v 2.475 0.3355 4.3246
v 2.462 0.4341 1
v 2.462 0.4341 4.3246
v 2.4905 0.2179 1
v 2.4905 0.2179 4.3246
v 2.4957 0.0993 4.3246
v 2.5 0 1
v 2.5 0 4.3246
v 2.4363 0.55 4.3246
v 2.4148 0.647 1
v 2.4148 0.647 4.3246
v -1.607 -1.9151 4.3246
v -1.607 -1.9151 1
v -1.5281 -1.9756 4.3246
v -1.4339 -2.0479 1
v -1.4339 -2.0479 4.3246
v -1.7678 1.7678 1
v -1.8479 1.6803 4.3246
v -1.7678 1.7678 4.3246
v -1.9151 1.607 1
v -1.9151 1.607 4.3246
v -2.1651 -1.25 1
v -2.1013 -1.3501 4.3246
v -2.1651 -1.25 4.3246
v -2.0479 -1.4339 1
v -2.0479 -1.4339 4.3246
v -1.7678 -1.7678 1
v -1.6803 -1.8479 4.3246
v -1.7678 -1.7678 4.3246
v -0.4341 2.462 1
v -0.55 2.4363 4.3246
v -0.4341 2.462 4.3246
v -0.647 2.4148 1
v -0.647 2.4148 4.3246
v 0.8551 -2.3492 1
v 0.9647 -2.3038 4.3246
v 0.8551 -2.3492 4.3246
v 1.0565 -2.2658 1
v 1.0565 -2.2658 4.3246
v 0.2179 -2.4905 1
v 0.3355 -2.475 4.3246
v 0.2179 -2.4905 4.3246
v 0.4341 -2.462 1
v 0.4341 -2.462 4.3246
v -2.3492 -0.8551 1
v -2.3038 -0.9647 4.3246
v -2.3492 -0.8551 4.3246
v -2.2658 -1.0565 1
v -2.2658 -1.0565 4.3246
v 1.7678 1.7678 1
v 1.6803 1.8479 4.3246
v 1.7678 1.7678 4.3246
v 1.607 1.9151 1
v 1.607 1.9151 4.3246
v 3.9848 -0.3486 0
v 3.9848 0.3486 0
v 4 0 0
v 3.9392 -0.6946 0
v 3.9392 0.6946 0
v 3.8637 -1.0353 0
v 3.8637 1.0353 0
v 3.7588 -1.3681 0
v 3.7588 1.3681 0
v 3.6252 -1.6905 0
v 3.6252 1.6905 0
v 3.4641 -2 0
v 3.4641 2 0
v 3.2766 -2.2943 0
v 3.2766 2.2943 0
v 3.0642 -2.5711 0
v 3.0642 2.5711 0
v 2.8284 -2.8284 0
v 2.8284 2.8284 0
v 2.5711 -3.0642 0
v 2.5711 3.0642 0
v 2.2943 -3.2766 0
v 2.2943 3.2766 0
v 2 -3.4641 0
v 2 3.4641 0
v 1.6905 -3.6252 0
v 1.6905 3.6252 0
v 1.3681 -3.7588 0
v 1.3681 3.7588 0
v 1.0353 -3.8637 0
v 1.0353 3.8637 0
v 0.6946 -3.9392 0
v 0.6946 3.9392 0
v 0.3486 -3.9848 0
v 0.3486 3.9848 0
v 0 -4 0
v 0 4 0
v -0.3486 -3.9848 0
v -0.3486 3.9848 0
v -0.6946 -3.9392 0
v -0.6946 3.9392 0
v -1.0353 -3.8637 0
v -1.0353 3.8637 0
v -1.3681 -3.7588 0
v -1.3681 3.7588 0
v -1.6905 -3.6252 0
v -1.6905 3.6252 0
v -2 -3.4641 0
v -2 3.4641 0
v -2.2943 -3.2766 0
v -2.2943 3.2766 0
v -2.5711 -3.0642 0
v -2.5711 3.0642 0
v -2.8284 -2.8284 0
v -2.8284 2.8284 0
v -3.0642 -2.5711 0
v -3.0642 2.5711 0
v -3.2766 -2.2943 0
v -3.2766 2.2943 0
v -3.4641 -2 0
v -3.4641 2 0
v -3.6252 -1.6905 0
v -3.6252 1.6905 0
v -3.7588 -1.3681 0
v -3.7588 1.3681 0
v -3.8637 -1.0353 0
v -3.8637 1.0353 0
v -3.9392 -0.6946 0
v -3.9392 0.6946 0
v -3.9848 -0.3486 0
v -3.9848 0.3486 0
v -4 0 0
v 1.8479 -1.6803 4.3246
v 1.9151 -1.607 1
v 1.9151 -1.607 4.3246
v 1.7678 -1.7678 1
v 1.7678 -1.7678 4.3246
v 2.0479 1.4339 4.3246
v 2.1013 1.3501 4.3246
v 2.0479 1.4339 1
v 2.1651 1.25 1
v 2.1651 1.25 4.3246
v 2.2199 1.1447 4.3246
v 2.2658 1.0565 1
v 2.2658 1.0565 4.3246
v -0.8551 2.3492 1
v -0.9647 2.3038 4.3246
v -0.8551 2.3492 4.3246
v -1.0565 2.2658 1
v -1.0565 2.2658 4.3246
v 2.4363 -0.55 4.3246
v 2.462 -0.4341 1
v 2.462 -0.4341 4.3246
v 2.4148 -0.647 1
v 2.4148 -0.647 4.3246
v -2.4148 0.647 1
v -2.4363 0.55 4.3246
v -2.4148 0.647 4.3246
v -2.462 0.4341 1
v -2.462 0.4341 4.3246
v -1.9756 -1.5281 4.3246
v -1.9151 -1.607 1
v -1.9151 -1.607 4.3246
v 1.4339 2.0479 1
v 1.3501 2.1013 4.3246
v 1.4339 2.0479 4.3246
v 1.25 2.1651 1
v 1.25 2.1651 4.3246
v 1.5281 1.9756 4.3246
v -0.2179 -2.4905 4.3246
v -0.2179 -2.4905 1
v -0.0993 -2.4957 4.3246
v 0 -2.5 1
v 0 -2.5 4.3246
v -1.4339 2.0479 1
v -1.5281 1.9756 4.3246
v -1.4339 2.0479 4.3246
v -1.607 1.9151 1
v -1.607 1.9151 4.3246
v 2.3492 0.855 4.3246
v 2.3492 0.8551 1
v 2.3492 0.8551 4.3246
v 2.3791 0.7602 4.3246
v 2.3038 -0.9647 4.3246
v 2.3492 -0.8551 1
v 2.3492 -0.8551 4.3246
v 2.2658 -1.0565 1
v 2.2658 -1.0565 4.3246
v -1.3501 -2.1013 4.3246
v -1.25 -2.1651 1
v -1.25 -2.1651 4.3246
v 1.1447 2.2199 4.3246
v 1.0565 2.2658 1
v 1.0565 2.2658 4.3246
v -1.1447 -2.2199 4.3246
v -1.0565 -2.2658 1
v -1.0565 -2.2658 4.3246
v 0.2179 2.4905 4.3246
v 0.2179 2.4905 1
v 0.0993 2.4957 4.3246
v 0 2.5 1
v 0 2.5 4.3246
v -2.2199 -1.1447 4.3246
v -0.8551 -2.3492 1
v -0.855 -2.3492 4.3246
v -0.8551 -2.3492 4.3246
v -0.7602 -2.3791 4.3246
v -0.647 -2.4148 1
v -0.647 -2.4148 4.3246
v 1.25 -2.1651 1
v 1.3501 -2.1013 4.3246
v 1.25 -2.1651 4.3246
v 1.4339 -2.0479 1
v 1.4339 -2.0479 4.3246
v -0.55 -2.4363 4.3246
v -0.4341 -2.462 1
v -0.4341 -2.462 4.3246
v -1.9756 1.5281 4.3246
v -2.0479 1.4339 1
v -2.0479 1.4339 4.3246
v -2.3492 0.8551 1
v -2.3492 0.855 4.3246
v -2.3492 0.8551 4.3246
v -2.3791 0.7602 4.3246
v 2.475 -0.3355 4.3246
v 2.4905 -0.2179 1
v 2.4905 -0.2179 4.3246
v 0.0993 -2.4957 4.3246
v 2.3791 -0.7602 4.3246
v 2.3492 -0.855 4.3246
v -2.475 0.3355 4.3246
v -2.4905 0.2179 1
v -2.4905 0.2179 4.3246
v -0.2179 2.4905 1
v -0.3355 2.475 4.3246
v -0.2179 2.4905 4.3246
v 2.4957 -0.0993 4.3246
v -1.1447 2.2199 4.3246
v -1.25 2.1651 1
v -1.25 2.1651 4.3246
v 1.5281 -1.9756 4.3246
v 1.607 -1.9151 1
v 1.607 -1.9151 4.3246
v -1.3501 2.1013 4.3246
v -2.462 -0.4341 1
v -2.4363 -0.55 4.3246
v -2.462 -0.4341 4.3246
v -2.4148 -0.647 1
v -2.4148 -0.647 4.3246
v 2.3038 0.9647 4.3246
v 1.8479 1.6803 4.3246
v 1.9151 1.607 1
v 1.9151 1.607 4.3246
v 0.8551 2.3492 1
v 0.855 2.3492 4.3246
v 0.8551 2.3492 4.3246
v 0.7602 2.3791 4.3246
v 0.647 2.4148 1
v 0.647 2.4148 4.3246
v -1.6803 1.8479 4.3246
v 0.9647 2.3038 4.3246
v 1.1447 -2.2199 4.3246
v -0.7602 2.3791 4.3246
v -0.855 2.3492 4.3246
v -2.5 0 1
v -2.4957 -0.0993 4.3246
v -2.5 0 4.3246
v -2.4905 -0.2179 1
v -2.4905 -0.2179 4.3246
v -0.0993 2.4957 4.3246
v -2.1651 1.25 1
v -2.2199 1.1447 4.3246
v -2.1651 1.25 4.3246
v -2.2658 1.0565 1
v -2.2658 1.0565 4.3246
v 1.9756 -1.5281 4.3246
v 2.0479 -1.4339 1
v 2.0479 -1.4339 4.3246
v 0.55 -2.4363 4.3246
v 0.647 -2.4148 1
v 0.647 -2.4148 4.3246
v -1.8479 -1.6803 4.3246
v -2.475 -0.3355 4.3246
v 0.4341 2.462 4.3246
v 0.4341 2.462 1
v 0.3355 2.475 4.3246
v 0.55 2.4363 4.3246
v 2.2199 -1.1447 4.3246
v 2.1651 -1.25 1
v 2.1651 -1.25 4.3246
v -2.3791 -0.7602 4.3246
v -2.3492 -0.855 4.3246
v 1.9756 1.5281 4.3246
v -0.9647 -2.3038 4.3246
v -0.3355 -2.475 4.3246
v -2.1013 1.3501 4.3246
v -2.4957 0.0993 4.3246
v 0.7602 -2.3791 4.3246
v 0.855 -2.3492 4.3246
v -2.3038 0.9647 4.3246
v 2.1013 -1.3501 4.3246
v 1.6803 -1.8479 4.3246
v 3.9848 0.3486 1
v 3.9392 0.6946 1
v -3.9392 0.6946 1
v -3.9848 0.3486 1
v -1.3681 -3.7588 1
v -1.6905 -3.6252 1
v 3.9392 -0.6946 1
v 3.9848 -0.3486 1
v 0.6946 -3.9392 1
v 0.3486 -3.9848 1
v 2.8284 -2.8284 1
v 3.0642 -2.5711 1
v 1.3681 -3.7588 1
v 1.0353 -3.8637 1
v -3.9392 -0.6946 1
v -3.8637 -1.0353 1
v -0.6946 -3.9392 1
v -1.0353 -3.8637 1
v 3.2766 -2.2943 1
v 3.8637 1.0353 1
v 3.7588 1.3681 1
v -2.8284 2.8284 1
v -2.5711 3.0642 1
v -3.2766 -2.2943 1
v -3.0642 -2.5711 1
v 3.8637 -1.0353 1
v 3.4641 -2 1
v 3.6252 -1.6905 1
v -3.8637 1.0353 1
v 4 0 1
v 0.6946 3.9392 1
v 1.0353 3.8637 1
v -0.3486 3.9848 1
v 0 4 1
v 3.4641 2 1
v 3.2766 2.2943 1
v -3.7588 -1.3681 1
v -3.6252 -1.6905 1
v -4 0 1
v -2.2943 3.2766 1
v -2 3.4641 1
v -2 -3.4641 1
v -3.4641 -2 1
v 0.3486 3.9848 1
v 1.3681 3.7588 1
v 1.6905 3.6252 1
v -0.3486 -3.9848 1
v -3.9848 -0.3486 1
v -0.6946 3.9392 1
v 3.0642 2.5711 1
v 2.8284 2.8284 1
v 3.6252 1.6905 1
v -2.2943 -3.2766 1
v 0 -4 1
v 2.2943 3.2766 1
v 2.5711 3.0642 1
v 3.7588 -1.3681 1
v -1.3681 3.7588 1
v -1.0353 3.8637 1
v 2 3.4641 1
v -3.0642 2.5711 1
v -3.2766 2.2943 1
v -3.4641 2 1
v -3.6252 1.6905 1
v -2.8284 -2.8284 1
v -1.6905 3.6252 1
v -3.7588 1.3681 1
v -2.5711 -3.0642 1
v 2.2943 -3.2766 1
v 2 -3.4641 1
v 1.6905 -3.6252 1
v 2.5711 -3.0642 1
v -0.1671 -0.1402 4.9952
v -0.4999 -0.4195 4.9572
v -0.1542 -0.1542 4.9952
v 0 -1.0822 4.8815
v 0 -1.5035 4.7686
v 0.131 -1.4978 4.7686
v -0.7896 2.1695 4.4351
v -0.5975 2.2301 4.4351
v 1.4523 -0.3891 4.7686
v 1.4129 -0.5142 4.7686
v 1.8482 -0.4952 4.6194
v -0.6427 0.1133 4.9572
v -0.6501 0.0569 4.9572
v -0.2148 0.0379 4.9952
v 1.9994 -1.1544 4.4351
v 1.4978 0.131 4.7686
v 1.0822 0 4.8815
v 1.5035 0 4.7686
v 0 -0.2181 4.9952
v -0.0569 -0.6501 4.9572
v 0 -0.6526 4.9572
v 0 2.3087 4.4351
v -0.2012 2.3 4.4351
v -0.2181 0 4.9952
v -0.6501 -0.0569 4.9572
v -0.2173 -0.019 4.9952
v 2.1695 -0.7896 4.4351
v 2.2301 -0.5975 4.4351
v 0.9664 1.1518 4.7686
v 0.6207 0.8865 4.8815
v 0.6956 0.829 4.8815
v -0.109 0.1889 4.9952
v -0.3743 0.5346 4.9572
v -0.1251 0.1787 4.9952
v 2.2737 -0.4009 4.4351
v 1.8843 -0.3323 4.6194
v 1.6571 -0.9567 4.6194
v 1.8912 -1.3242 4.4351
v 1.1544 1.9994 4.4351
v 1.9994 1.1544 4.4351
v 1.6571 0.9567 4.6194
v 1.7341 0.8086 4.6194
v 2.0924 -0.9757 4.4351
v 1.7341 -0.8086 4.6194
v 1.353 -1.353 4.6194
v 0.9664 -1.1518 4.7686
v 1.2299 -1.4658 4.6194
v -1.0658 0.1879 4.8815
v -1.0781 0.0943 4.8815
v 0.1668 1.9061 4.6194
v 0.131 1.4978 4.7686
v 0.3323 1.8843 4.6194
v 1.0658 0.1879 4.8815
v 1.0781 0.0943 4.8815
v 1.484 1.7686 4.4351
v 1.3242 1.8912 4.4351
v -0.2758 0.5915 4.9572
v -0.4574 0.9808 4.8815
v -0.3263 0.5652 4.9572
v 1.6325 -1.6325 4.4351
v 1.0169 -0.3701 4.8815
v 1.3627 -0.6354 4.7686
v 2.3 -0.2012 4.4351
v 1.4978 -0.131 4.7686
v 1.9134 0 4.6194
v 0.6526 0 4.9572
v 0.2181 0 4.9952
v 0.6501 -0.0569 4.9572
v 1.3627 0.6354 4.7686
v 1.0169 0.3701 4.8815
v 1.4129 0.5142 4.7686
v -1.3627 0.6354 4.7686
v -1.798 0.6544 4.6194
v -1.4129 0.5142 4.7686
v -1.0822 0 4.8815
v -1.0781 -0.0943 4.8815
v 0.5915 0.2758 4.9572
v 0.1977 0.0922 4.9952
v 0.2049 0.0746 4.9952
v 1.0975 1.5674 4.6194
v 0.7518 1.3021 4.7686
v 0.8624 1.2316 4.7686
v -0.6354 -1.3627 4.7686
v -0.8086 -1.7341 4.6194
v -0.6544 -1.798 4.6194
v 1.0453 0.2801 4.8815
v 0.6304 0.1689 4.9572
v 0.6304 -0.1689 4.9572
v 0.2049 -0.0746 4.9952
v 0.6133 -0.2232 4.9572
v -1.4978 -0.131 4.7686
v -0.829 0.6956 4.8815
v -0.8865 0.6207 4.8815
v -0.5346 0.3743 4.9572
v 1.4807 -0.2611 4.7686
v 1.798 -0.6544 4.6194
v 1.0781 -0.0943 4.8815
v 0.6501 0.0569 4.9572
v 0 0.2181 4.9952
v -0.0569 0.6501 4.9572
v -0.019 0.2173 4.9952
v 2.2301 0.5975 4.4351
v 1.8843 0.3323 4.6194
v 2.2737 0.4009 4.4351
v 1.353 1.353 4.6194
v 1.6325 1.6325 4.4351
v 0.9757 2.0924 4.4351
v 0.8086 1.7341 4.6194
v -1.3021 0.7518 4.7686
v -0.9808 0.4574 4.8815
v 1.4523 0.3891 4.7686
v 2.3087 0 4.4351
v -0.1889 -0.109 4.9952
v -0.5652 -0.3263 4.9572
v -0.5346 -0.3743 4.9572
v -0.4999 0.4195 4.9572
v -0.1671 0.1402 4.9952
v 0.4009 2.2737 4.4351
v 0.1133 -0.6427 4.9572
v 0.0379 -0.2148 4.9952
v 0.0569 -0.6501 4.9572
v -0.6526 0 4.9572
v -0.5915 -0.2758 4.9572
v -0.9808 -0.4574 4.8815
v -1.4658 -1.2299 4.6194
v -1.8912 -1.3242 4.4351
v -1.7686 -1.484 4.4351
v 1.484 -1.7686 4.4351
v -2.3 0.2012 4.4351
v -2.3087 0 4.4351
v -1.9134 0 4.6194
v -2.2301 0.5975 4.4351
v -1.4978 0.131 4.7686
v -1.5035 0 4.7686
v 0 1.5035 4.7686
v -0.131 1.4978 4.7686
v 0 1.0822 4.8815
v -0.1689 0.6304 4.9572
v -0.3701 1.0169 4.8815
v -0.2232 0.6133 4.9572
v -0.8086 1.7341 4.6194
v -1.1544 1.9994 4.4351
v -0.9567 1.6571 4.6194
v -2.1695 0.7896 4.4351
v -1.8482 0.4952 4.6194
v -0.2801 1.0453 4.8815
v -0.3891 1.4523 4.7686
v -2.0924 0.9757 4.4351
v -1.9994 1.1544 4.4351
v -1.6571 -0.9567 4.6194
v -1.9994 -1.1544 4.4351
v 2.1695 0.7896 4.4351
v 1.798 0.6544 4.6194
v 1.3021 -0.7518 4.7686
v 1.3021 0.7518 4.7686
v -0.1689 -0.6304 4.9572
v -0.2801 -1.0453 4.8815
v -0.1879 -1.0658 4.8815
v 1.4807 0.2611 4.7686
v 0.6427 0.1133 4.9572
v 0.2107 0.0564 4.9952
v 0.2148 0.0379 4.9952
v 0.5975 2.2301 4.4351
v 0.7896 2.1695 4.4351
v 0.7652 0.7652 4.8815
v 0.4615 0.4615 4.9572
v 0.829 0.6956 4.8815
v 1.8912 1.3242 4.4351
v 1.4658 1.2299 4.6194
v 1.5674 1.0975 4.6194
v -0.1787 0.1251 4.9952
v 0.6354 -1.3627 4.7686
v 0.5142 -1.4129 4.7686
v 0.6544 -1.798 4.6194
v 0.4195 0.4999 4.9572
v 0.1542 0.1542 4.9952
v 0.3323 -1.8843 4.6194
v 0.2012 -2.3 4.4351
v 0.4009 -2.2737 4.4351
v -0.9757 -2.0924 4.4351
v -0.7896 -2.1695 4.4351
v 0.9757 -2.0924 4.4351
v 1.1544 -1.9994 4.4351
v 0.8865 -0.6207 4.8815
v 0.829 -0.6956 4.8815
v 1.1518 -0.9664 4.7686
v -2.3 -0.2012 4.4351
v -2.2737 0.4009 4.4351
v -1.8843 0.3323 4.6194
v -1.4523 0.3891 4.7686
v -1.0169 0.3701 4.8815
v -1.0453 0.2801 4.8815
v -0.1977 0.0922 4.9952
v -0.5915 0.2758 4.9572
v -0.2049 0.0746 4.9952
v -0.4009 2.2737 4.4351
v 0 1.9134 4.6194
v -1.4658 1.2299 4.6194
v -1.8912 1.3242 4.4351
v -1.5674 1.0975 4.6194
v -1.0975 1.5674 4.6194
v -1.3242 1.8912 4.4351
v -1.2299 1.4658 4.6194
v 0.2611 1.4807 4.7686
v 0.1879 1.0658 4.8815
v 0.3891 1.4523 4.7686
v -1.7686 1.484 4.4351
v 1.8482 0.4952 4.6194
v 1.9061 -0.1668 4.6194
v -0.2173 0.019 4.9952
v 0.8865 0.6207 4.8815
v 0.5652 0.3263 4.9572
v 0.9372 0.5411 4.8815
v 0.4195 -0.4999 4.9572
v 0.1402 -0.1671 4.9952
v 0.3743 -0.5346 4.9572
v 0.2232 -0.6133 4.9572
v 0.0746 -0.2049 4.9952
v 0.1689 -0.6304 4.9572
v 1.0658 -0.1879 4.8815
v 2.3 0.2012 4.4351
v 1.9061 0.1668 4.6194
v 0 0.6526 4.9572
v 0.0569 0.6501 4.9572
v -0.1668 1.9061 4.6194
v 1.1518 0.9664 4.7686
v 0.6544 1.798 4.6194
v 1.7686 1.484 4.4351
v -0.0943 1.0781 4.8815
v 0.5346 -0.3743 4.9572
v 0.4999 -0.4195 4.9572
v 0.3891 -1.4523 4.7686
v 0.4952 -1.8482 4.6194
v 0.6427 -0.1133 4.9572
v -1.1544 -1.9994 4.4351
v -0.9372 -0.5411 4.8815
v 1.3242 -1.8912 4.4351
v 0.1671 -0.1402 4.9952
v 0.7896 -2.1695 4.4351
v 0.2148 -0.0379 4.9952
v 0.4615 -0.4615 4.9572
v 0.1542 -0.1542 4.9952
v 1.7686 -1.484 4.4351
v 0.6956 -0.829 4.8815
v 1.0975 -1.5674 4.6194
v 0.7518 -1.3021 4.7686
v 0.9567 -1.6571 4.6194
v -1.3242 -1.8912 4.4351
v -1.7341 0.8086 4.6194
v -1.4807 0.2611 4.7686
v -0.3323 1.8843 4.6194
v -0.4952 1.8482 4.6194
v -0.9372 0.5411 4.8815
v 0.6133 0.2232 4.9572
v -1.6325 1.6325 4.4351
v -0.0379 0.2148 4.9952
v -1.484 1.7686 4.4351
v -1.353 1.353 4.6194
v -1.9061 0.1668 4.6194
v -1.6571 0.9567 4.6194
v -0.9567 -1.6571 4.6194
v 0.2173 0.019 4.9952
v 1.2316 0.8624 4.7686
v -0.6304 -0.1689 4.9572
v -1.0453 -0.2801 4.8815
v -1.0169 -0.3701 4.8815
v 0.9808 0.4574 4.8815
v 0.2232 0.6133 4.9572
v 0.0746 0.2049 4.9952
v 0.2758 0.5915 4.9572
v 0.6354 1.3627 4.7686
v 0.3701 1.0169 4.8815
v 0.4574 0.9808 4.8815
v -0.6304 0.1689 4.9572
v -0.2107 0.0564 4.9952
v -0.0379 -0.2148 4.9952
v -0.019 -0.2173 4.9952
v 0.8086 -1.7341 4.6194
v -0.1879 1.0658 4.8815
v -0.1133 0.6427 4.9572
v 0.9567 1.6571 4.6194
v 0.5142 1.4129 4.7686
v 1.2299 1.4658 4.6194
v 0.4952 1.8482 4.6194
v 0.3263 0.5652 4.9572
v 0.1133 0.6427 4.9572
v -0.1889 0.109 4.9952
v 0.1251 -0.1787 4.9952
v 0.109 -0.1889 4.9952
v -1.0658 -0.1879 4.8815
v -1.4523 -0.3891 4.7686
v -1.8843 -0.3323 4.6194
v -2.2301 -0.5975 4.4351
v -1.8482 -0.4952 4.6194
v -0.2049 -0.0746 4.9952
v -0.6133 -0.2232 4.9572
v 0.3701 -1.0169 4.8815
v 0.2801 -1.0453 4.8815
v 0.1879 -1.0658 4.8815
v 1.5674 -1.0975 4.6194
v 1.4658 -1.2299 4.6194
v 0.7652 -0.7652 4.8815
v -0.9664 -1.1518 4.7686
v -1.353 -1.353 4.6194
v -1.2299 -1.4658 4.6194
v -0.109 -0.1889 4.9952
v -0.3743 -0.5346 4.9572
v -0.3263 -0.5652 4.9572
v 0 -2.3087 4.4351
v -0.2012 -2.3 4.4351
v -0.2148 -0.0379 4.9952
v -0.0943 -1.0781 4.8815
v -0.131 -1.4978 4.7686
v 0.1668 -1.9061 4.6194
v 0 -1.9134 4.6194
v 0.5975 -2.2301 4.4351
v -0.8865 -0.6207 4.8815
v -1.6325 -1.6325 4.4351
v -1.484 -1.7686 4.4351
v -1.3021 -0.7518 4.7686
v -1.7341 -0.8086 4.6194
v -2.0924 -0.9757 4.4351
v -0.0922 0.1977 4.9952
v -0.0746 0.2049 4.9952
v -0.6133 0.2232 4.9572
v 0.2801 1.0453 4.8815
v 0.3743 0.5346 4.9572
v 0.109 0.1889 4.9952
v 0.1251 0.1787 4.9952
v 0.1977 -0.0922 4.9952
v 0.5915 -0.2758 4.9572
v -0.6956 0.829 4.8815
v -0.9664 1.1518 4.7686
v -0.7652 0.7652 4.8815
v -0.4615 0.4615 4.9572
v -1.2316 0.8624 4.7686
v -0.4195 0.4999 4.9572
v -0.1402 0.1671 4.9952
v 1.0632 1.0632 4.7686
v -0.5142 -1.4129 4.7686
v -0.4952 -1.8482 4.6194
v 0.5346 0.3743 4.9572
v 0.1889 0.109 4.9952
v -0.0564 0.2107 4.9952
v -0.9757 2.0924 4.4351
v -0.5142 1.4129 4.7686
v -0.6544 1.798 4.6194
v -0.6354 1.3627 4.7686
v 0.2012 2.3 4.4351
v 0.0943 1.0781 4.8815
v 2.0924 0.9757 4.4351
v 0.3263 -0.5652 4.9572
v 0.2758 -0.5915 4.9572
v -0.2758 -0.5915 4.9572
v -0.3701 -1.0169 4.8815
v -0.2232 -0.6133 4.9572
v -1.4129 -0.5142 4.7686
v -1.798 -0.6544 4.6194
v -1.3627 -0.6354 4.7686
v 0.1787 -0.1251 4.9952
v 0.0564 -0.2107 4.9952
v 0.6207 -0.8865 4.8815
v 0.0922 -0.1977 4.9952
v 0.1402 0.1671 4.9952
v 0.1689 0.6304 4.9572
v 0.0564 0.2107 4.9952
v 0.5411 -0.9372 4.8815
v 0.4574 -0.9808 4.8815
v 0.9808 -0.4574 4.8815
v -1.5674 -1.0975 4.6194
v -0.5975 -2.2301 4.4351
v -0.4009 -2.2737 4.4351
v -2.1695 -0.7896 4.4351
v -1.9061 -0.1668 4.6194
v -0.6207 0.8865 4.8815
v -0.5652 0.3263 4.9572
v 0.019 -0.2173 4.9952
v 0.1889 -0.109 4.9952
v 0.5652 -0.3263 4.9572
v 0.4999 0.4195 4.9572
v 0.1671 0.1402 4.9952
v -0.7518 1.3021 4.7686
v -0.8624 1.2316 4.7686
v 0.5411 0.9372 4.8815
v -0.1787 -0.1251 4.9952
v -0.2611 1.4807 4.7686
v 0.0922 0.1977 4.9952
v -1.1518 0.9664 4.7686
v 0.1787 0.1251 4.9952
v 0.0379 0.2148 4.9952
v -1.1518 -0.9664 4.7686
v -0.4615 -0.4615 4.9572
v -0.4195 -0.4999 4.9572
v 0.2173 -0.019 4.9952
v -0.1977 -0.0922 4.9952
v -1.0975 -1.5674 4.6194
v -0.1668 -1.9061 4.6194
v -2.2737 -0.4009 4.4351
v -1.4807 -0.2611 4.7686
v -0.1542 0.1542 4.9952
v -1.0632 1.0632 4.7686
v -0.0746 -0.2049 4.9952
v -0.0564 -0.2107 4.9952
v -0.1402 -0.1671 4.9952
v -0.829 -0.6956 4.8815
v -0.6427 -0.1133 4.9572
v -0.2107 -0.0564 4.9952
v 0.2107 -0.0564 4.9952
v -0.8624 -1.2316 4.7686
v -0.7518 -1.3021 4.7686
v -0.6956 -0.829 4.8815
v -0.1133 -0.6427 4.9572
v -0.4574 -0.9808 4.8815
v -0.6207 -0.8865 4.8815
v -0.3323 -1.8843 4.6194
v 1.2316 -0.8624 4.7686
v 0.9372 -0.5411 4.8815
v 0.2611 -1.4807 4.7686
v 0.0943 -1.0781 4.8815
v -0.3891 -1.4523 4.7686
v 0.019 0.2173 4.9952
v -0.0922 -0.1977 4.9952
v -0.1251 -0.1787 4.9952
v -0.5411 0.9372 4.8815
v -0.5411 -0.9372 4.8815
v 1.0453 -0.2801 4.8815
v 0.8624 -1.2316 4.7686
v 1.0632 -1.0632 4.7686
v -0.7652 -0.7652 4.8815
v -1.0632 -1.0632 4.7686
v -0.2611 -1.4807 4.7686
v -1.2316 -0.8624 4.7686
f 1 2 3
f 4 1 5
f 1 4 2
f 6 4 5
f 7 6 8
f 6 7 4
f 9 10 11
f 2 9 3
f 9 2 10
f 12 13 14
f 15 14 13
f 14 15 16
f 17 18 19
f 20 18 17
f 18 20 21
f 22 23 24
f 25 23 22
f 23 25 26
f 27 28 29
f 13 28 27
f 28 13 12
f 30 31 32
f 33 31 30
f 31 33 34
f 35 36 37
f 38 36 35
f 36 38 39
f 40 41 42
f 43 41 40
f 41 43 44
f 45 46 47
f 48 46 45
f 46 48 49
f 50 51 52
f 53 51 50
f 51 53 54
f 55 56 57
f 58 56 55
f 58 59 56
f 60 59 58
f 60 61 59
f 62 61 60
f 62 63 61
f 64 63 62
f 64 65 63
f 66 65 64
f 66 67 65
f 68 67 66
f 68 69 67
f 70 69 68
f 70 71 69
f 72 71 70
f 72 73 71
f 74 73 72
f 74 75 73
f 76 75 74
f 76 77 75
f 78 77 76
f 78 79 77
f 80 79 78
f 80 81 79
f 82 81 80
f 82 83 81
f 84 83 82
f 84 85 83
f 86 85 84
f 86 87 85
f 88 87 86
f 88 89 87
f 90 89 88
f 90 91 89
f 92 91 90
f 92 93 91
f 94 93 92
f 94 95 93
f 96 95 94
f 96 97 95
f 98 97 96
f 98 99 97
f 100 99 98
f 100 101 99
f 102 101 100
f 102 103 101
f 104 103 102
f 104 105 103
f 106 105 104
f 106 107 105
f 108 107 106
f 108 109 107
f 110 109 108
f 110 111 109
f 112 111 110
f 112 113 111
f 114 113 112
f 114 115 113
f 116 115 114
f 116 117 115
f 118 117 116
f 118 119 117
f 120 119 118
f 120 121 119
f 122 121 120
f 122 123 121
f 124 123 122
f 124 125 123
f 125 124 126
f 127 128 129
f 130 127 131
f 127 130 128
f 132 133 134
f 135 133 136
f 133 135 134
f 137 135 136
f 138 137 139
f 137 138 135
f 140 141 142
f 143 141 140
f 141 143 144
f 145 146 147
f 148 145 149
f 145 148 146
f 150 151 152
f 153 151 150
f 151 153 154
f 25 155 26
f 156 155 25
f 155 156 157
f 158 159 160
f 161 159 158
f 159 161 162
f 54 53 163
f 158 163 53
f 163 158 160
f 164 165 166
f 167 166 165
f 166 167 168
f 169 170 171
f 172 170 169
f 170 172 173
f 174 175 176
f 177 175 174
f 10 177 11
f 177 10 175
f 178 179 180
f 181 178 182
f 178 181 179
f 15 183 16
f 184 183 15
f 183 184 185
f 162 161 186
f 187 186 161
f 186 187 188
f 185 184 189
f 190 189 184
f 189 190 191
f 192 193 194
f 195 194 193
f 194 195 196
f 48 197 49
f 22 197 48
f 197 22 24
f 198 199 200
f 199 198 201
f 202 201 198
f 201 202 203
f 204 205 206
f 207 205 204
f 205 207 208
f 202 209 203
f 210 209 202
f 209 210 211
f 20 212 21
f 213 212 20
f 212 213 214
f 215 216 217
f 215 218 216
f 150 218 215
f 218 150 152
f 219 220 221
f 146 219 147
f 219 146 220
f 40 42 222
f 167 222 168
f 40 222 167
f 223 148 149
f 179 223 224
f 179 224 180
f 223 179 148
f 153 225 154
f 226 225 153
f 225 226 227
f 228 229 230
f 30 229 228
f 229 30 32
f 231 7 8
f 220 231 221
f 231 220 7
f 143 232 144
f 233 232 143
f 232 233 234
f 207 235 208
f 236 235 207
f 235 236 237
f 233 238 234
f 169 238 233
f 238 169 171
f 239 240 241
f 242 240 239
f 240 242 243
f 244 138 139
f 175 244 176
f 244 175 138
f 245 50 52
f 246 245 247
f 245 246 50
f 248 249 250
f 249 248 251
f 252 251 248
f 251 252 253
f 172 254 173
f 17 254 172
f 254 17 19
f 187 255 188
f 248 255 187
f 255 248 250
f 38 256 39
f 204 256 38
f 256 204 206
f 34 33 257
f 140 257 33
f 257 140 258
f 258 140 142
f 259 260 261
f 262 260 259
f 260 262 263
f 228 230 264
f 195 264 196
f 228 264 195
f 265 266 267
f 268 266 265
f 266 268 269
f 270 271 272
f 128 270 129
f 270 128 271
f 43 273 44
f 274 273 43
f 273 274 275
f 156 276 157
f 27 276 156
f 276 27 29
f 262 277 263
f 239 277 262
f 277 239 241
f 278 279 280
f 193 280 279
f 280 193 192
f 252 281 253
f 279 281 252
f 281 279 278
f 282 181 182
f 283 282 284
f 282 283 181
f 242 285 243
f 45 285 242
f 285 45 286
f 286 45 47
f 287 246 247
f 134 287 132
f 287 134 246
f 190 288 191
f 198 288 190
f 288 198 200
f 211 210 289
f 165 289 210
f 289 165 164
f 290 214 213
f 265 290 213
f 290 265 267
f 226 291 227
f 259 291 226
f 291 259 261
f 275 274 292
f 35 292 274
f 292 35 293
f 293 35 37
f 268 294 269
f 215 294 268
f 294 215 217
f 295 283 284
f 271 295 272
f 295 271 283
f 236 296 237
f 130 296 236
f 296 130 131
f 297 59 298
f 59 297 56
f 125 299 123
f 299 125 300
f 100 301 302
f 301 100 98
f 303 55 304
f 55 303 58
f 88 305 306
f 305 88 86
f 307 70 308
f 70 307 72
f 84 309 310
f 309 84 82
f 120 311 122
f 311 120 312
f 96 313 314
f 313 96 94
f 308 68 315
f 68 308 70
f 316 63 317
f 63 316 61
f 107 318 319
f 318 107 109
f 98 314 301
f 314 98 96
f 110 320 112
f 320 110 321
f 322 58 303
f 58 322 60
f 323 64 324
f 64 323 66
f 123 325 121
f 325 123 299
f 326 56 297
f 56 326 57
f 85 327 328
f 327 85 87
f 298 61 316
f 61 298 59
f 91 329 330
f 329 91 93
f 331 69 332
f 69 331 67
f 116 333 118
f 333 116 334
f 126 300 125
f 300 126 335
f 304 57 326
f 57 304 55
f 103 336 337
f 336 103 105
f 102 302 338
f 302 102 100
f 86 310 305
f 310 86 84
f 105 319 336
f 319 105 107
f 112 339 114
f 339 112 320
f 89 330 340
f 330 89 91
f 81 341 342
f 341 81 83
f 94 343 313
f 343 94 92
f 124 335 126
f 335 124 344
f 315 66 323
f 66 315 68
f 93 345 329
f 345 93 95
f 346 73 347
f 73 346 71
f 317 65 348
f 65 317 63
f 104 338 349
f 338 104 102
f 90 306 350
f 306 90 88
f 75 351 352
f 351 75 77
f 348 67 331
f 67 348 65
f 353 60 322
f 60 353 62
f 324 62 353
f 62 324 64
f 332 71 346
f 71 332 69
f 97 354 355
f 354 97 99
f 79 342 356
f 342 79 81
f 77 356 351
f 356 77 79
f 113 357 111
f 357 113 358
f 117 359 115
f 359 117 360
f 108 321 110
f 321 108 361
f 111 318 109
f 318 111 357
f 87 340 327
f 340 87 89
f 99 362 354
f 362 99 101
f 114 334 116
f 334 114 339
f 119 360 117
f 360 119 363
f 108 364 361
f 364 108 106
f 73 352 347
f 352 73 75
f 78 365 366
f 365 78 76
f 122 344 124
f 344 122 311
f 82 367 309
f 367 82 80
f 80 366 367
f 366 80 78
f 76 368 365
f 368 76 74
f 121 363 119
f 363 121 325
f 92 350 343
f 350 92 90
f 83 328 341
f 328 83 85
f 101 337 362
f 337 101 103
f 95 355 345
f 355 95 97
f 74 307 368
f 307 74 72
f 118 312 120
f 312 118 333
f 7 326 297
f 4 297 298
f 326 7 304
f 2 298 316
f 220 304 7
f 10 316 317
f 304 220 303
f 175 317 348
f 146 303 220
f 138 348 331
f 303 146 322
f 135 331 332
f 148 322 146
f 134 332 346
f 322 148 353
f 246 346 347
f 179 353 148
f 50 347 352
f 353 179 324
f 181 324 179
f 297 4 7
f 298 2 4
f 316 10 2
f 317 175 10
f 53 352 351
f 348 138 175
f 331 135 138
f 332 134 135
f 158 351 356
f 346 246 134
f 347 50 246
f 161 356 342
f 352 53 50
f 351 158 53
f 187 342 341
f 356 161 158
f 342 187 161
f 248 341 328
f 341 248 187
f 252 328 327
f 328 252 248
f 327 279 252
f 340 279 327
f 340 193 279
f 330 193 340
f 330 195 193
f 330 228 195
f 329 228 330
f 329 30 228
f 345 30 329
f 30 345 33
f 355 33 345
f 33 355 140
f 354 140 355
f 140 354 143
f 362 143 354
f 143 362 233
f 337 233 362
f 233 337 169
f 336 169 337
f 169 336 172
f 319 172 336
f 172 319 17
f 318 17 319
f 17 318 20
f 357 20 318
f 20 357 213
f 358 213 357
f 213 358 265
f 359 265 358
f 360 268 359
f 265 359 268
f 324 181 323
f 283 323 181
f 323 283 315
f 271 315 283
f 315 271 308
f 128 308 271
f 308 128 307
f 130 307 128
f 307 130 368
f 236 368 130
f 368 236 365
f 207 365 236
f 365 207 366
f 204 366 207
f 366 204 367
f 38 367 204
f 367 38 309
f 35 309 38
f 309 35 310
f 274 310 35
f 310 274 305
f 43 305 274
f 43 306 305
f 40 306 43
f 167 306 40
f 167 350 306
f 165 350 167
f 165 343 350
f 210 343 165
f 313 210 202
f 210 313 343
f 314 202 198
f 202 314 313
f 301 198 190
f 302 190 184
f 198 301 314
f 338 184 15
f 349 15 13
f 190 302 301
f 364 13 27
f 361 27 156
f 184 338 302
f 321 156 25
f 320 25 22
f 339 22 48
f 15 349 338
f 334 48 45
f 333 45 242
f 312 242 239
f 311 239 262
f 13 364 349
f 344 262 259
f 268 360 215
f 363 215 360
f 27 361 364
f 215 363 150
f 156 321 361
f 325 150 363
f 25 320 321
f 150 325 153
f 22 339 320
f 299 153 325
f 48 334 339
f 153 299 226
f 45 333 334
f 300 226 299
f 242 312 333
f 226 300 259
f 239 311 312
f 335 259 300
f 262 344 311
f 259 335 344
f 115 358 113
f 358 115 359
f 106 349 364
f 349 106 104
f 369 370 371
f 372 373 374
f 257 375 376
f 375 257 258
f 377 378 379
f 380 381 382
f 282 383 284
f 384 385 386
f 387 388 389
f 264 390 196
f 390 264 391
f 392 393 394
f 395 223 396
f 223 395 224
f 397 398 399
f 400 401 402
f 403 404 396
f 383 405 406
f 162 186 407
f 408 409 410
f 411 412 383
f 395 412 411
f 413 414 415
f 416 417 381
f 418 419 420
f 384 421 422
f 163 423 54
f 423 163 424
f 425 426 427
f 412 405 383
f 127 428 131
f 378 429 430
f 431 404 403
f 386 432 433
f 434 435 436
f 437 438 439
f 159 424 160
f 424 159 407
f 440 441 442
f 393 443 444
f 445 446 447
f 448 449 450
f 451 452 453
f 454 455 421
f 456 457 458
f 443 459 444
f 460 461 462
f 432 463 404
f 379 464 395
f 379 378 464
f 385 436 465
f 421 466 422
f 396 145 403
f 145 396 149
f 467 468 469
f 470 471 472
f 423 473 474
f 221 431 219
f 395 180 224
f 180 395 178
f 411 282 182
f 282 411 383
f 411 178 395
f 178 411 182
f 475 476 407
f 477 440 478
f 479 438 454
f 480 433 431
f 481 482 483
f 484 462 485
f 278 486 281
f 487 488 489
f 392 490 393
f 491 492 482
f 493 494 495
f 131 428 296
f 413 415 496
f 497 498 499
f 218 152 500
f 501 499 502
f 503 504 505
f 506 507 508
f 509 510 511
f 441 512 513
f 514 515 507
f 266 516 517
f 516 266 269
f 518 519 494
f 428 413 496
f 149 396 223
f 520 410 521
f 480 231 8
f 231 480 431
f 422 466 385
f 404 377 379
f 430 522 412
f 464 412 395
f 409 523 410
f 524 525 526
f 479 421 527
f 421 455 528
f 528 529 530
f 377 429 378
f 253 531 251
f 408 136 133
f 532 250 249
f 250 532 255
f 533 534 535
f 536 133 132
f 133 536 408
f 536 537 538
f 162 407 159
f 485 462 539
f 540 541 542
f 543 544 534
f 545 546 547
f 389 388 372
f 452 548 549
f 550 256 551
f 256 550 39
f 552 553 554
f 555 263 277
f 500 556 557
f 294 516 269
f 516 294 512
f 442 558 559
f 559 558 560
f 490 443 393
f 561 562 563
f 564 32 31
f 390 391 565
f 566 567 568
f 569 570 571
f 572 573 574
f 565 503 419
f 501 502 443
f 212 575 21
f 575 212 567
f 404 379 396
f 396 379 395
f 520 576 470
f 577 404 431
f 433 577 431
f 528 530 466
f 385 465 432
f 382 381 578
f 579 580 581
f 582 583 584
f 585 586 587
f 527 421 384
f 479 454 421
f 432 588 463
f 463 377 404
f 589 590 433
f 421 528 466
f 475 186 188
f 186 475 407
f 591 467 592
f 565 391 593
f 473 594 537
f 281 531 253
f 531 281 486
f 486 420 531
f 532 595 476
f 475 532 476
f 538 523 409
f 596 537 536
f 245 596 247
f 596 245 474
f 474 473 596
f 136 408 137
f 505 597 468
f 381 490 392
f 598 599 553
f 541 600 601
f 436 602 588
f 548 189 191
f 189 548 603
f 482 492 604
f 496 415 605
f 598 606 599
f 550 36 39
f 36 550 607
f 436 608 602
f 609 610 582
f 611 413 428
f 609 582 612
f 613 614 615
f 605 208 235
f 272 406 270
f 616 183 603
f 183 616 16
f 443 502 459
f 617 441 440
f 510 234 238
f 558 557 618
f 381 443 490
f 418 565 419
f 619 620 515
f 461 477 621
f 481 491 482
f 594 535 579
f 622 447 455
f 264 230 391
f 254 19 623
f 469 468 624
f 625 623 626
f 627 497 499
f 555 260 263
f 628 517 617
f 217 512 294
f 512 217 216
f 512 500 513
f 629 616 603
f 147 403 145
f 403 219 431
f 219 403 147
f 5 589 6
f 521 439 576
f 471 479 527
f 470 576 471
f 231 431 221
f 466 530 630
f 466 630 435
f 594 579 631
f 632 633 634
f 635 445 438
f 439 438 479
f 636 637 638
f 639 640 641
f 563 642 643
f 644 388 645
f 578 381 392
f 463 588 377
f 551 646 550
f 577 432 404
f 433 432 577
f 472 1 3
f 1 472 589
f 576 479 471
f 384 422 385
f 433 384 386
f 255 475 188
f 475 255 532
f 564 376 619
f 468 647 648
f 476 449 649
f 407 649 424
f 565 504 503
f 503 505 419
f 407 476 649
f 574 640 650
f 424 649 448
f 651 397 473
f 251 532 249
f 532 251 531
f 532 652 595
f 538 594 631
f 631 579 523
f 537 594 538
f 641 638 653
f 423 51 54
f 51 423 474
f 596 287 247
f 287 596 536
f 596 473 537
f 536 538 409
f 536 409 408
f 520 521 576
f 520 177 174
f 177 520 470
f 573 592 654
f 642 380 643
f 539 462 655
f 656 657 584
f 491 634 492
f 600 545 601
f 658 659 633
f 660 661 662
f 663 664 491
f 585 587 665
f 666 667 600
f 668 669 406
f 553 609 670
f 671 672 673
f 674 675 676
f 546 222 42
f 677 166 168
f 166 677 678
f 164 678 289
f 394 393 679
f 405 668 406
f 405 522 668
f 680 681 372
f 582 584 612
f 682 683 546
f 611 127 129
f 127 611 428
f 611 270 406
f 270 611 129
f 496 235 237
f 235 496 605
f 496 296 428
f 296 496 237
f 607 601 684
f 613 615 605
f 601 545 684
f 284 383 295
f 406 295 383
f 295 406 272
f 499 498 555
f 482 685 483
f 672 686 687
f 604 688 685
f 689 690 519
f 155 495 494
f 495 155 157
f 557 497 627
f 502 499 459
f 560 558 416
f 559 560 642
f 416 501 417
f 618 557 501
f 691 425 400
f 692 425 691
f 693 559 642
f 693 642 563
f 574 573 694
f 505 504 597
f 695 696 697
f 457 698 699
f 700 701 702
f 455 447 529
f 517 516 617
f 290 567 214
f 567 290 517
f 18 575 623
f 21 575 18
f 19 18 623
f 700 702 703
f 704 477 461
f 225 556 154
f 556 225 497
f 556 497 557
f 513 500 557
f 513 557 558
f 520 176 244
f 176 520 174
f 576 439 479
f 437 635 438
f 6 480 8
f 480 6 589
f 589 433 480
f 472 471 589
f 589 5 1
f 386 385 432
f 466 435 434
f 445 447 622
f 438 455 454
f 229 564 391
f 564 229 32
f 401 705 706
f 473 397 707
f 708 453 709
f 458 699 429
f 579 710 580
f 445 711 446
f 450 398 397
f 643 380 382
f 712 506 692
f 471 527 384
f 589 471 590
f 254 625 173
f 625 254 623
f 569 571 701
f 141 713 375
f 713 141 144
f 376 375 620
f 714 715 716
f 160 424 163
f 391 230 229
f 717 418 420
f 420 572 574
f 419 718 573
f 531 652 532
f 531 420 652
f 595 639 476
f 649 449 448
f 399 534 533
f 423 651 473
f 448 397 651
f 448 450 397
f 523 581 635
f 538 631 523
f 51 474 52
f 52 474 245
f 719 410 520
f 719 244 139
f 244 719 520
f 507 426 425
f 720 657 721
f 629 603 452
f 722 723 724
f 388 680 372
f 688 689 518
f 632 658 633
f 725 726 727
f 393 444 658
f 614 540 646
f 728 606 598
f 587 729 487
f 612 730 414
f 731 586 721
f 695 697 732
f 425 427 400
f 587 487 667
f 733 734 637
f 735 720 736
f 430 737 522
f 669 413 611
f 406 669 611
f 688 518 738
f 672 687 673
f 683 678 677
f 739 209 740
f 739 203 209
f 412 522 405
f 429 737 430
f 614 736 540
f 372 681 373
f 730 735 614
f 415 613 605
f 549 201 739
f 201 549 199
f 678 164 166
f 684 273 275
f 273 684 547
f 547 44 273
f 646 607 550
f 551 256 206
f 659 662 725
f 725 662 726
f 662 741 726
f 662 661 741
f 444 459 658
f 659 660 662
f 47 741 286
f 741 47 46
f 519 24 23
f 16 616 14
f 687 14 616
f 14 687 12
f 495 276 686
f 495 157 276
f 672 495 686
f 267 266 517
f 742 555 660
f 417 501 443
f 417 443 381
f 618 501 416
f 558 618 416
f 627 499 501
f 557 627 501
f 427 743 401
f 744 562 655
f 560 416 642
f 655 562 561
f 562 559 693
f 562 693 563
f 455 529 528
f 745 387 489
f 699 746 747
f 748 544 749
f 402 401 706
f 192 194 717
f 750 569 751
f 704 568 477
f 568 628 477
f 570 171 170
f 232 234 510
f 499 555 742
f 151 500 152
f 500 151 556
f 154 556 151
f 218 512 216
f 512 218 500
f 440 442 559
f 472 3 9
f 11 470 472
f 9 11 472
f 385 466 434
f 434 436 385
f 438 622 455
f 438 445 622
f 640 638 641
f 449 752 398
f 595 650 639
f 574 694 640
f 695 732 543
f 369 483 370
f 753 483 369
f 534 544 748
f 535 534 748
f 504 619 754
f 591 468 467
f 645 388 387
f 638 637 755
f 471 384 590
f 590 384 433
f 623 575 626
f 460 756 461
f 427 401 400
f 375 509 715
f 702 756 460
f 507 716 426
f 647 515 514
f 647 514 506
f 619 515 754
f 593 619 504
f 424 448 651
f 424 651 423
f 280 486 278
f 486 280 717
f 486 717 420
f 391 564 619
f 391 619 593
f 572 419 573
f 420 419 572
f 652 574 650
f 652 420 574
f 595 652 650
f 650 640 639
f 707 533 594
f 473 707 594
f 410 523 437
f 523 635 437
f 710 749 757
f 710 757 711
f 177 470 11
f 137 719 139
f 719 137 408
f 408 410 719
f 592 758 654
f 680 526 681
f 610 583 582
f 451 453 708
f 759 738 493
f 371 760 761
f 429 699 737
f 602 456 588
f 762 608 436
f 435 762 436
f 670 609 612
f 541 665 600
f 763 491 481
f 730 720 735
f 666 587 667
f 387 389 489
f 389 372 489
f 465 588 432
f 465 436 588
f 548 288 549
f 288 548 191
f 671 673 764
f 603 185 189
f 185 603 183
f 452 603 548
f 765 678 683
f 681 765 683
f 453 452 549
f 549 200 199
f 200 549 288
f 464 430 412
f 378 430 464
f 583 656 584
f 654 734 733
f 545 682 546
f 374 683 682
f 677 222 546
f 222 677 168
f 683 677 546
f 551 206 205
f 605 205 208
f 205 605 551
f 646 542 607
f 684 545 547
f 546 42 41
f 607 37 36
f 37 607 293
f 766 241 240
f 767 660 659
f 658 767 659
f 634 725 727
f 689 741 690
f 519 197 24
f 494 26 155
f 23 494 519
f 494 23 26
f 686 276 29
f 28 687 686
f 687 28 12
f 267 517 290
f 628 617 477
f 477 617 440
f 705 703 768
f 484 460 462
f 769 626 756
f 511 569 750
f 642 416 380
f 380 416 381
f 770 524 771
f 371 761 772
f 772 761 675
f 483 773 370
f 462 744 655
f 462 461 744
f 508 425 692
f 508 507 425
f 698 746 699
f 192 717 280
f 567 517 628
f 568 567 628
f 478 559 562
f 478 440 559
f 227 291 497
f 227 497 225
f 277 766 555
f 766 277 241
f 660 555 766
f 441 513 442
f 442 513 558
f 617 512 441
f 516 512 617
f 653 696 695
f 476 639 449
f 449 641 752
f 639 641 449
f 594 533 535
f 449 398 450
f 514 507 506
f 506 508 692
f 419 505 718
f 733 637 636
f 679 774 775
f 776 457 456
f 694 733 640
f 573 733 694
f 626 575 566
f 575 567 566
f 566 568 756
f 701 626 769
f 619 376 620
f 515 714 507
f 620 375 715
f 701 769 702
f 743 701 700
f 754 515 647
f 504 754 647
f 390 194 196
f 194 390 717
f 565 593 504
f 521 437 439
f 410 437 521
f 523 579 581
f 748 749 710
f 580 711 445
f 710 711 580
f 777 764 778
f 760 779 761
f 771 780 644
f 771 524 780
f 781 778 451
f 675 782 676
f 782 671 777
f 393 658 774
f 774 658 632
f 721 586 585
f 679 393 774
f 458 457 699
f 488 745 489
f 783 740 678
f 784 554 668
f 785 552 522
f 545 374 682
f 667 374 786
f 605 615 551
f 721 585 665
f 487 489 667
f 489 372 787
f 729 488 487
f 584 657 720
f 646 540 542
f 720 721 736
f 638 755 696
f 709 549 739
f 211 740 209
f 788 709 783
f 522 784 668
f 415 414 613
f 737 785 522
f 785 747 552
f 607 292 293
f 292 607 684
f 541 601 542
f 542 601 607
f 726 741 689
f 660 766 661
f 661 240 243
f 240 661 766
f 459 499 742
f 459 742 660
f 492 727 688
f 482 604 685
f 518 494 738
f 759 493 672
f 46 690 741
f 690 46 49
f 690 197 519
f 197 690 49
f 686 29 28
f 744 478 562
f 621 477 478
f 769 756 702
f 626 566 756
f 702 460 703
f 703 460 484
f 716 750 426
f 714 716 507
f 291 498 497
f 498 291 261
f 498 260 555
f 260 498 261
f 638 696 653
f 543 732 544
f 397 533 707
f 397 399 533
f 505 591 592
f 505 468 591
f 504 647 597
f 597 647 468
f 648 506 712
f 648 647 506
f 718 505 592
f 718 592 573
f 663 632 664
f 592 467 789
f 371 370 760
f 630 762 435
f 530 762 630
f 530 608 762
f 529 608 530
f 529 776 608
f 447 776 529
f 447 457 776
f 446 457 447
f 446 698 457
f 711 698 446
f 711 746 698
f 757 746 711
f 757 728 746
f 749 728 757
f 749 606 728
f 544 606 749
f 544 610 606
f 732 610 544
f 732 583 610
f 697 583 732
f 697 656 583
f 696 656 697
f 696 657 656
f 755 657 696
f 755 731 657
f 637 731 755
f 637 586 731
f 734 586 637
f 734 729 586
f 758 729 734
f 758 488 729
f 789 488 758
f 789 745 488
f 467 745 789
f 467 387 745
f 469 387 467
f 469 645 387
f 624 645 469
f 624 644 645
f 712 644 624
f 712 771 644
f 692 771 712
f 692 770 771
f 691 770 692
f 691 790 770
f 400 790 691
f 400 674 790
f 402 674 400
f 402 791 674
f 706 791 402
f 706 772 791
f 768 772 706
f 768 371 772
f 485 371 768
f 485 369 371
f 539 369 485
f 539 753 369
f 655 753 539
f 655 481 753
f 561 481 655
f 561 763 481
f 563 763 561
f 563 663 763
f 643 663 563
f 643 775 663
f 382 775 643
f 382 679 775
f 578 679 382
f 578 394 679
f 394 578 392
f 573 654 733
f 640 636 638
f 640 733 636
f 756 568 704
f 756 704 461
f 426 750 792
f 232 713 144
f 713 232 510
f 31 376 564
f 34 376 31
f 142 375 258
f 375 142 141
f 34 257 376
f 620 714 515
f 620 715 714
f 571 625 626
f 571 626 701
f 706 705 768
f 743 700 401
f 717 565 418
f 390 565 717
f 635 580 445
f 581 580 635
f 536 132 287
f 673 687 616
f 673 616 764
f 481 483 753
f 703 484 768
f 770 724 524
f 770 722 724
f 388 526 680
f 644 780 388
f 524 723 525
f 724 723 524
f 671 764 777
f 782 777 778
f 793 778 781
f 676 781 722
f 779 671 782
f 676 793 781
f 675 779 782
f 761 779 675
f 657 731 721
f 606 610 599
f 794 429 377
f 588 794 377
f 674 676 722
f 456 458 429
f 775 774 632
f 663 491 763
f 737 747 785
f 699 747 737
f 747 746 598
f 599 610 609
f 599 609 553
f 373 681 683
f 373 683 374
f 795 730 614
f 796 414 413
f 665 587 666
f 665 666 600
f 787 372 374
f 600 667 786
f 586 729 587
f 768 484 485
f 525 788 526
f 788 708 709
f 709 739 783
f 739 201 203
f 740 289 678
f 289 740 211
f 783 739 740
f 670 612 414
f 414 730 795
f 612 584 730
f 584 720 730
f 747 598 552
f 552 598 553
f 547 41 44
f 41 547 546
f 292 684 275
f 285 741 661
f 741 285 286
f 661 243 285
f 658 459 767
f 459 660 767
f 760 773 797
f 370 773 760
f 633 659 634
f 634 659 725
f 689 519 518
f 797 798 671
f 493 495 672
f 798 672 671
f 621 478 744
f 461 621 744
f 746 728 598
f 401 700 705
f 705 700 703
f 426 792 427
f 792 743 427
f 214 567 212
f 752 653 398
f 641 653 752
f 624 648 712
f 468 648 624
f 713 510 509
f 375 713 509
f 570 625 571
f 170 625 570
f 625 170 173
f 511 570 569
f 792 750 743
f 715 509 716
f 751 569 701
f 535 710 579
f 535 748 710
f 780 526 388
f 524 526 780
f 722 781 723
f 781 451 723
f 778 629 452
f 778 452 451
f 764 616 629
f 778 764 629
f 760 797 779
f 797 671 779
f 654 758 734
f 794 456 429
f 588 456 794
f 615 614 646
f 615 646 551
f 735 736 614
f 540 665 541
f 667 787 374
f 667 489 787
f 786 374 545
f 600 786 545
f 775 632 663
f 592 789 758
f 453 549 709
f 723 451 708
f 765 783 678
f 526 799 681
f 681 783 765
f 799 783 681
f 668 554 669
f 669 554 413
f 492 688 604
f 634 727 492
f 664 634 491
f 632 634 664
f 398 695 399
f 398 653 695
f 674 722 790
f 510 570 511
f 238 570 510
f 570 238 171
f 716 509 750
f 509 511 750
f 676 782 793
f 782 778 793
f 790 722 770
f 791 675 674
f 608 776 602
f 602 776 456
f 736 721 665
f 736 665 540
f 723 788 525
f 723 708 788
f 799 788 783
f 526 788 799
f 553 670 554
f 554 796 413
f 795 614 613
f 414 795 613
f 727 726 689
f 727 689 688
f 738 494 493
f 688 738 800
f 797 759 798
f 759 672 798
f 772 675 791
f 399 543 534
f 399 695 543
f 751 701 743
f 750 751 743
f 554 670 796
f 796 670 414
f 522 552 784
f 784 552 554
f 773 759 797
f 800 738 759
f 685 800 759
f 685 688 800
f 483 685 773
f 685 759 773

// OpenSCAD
// button
$fn = $preview ? 12 : 72;
wall =2;
intersection() {
    union() {
    cylinder(d=5, h=2+wall+1);
    cylinder(d=5+3, h=1);
    }
    sphere(r=2+wall+1);
}
